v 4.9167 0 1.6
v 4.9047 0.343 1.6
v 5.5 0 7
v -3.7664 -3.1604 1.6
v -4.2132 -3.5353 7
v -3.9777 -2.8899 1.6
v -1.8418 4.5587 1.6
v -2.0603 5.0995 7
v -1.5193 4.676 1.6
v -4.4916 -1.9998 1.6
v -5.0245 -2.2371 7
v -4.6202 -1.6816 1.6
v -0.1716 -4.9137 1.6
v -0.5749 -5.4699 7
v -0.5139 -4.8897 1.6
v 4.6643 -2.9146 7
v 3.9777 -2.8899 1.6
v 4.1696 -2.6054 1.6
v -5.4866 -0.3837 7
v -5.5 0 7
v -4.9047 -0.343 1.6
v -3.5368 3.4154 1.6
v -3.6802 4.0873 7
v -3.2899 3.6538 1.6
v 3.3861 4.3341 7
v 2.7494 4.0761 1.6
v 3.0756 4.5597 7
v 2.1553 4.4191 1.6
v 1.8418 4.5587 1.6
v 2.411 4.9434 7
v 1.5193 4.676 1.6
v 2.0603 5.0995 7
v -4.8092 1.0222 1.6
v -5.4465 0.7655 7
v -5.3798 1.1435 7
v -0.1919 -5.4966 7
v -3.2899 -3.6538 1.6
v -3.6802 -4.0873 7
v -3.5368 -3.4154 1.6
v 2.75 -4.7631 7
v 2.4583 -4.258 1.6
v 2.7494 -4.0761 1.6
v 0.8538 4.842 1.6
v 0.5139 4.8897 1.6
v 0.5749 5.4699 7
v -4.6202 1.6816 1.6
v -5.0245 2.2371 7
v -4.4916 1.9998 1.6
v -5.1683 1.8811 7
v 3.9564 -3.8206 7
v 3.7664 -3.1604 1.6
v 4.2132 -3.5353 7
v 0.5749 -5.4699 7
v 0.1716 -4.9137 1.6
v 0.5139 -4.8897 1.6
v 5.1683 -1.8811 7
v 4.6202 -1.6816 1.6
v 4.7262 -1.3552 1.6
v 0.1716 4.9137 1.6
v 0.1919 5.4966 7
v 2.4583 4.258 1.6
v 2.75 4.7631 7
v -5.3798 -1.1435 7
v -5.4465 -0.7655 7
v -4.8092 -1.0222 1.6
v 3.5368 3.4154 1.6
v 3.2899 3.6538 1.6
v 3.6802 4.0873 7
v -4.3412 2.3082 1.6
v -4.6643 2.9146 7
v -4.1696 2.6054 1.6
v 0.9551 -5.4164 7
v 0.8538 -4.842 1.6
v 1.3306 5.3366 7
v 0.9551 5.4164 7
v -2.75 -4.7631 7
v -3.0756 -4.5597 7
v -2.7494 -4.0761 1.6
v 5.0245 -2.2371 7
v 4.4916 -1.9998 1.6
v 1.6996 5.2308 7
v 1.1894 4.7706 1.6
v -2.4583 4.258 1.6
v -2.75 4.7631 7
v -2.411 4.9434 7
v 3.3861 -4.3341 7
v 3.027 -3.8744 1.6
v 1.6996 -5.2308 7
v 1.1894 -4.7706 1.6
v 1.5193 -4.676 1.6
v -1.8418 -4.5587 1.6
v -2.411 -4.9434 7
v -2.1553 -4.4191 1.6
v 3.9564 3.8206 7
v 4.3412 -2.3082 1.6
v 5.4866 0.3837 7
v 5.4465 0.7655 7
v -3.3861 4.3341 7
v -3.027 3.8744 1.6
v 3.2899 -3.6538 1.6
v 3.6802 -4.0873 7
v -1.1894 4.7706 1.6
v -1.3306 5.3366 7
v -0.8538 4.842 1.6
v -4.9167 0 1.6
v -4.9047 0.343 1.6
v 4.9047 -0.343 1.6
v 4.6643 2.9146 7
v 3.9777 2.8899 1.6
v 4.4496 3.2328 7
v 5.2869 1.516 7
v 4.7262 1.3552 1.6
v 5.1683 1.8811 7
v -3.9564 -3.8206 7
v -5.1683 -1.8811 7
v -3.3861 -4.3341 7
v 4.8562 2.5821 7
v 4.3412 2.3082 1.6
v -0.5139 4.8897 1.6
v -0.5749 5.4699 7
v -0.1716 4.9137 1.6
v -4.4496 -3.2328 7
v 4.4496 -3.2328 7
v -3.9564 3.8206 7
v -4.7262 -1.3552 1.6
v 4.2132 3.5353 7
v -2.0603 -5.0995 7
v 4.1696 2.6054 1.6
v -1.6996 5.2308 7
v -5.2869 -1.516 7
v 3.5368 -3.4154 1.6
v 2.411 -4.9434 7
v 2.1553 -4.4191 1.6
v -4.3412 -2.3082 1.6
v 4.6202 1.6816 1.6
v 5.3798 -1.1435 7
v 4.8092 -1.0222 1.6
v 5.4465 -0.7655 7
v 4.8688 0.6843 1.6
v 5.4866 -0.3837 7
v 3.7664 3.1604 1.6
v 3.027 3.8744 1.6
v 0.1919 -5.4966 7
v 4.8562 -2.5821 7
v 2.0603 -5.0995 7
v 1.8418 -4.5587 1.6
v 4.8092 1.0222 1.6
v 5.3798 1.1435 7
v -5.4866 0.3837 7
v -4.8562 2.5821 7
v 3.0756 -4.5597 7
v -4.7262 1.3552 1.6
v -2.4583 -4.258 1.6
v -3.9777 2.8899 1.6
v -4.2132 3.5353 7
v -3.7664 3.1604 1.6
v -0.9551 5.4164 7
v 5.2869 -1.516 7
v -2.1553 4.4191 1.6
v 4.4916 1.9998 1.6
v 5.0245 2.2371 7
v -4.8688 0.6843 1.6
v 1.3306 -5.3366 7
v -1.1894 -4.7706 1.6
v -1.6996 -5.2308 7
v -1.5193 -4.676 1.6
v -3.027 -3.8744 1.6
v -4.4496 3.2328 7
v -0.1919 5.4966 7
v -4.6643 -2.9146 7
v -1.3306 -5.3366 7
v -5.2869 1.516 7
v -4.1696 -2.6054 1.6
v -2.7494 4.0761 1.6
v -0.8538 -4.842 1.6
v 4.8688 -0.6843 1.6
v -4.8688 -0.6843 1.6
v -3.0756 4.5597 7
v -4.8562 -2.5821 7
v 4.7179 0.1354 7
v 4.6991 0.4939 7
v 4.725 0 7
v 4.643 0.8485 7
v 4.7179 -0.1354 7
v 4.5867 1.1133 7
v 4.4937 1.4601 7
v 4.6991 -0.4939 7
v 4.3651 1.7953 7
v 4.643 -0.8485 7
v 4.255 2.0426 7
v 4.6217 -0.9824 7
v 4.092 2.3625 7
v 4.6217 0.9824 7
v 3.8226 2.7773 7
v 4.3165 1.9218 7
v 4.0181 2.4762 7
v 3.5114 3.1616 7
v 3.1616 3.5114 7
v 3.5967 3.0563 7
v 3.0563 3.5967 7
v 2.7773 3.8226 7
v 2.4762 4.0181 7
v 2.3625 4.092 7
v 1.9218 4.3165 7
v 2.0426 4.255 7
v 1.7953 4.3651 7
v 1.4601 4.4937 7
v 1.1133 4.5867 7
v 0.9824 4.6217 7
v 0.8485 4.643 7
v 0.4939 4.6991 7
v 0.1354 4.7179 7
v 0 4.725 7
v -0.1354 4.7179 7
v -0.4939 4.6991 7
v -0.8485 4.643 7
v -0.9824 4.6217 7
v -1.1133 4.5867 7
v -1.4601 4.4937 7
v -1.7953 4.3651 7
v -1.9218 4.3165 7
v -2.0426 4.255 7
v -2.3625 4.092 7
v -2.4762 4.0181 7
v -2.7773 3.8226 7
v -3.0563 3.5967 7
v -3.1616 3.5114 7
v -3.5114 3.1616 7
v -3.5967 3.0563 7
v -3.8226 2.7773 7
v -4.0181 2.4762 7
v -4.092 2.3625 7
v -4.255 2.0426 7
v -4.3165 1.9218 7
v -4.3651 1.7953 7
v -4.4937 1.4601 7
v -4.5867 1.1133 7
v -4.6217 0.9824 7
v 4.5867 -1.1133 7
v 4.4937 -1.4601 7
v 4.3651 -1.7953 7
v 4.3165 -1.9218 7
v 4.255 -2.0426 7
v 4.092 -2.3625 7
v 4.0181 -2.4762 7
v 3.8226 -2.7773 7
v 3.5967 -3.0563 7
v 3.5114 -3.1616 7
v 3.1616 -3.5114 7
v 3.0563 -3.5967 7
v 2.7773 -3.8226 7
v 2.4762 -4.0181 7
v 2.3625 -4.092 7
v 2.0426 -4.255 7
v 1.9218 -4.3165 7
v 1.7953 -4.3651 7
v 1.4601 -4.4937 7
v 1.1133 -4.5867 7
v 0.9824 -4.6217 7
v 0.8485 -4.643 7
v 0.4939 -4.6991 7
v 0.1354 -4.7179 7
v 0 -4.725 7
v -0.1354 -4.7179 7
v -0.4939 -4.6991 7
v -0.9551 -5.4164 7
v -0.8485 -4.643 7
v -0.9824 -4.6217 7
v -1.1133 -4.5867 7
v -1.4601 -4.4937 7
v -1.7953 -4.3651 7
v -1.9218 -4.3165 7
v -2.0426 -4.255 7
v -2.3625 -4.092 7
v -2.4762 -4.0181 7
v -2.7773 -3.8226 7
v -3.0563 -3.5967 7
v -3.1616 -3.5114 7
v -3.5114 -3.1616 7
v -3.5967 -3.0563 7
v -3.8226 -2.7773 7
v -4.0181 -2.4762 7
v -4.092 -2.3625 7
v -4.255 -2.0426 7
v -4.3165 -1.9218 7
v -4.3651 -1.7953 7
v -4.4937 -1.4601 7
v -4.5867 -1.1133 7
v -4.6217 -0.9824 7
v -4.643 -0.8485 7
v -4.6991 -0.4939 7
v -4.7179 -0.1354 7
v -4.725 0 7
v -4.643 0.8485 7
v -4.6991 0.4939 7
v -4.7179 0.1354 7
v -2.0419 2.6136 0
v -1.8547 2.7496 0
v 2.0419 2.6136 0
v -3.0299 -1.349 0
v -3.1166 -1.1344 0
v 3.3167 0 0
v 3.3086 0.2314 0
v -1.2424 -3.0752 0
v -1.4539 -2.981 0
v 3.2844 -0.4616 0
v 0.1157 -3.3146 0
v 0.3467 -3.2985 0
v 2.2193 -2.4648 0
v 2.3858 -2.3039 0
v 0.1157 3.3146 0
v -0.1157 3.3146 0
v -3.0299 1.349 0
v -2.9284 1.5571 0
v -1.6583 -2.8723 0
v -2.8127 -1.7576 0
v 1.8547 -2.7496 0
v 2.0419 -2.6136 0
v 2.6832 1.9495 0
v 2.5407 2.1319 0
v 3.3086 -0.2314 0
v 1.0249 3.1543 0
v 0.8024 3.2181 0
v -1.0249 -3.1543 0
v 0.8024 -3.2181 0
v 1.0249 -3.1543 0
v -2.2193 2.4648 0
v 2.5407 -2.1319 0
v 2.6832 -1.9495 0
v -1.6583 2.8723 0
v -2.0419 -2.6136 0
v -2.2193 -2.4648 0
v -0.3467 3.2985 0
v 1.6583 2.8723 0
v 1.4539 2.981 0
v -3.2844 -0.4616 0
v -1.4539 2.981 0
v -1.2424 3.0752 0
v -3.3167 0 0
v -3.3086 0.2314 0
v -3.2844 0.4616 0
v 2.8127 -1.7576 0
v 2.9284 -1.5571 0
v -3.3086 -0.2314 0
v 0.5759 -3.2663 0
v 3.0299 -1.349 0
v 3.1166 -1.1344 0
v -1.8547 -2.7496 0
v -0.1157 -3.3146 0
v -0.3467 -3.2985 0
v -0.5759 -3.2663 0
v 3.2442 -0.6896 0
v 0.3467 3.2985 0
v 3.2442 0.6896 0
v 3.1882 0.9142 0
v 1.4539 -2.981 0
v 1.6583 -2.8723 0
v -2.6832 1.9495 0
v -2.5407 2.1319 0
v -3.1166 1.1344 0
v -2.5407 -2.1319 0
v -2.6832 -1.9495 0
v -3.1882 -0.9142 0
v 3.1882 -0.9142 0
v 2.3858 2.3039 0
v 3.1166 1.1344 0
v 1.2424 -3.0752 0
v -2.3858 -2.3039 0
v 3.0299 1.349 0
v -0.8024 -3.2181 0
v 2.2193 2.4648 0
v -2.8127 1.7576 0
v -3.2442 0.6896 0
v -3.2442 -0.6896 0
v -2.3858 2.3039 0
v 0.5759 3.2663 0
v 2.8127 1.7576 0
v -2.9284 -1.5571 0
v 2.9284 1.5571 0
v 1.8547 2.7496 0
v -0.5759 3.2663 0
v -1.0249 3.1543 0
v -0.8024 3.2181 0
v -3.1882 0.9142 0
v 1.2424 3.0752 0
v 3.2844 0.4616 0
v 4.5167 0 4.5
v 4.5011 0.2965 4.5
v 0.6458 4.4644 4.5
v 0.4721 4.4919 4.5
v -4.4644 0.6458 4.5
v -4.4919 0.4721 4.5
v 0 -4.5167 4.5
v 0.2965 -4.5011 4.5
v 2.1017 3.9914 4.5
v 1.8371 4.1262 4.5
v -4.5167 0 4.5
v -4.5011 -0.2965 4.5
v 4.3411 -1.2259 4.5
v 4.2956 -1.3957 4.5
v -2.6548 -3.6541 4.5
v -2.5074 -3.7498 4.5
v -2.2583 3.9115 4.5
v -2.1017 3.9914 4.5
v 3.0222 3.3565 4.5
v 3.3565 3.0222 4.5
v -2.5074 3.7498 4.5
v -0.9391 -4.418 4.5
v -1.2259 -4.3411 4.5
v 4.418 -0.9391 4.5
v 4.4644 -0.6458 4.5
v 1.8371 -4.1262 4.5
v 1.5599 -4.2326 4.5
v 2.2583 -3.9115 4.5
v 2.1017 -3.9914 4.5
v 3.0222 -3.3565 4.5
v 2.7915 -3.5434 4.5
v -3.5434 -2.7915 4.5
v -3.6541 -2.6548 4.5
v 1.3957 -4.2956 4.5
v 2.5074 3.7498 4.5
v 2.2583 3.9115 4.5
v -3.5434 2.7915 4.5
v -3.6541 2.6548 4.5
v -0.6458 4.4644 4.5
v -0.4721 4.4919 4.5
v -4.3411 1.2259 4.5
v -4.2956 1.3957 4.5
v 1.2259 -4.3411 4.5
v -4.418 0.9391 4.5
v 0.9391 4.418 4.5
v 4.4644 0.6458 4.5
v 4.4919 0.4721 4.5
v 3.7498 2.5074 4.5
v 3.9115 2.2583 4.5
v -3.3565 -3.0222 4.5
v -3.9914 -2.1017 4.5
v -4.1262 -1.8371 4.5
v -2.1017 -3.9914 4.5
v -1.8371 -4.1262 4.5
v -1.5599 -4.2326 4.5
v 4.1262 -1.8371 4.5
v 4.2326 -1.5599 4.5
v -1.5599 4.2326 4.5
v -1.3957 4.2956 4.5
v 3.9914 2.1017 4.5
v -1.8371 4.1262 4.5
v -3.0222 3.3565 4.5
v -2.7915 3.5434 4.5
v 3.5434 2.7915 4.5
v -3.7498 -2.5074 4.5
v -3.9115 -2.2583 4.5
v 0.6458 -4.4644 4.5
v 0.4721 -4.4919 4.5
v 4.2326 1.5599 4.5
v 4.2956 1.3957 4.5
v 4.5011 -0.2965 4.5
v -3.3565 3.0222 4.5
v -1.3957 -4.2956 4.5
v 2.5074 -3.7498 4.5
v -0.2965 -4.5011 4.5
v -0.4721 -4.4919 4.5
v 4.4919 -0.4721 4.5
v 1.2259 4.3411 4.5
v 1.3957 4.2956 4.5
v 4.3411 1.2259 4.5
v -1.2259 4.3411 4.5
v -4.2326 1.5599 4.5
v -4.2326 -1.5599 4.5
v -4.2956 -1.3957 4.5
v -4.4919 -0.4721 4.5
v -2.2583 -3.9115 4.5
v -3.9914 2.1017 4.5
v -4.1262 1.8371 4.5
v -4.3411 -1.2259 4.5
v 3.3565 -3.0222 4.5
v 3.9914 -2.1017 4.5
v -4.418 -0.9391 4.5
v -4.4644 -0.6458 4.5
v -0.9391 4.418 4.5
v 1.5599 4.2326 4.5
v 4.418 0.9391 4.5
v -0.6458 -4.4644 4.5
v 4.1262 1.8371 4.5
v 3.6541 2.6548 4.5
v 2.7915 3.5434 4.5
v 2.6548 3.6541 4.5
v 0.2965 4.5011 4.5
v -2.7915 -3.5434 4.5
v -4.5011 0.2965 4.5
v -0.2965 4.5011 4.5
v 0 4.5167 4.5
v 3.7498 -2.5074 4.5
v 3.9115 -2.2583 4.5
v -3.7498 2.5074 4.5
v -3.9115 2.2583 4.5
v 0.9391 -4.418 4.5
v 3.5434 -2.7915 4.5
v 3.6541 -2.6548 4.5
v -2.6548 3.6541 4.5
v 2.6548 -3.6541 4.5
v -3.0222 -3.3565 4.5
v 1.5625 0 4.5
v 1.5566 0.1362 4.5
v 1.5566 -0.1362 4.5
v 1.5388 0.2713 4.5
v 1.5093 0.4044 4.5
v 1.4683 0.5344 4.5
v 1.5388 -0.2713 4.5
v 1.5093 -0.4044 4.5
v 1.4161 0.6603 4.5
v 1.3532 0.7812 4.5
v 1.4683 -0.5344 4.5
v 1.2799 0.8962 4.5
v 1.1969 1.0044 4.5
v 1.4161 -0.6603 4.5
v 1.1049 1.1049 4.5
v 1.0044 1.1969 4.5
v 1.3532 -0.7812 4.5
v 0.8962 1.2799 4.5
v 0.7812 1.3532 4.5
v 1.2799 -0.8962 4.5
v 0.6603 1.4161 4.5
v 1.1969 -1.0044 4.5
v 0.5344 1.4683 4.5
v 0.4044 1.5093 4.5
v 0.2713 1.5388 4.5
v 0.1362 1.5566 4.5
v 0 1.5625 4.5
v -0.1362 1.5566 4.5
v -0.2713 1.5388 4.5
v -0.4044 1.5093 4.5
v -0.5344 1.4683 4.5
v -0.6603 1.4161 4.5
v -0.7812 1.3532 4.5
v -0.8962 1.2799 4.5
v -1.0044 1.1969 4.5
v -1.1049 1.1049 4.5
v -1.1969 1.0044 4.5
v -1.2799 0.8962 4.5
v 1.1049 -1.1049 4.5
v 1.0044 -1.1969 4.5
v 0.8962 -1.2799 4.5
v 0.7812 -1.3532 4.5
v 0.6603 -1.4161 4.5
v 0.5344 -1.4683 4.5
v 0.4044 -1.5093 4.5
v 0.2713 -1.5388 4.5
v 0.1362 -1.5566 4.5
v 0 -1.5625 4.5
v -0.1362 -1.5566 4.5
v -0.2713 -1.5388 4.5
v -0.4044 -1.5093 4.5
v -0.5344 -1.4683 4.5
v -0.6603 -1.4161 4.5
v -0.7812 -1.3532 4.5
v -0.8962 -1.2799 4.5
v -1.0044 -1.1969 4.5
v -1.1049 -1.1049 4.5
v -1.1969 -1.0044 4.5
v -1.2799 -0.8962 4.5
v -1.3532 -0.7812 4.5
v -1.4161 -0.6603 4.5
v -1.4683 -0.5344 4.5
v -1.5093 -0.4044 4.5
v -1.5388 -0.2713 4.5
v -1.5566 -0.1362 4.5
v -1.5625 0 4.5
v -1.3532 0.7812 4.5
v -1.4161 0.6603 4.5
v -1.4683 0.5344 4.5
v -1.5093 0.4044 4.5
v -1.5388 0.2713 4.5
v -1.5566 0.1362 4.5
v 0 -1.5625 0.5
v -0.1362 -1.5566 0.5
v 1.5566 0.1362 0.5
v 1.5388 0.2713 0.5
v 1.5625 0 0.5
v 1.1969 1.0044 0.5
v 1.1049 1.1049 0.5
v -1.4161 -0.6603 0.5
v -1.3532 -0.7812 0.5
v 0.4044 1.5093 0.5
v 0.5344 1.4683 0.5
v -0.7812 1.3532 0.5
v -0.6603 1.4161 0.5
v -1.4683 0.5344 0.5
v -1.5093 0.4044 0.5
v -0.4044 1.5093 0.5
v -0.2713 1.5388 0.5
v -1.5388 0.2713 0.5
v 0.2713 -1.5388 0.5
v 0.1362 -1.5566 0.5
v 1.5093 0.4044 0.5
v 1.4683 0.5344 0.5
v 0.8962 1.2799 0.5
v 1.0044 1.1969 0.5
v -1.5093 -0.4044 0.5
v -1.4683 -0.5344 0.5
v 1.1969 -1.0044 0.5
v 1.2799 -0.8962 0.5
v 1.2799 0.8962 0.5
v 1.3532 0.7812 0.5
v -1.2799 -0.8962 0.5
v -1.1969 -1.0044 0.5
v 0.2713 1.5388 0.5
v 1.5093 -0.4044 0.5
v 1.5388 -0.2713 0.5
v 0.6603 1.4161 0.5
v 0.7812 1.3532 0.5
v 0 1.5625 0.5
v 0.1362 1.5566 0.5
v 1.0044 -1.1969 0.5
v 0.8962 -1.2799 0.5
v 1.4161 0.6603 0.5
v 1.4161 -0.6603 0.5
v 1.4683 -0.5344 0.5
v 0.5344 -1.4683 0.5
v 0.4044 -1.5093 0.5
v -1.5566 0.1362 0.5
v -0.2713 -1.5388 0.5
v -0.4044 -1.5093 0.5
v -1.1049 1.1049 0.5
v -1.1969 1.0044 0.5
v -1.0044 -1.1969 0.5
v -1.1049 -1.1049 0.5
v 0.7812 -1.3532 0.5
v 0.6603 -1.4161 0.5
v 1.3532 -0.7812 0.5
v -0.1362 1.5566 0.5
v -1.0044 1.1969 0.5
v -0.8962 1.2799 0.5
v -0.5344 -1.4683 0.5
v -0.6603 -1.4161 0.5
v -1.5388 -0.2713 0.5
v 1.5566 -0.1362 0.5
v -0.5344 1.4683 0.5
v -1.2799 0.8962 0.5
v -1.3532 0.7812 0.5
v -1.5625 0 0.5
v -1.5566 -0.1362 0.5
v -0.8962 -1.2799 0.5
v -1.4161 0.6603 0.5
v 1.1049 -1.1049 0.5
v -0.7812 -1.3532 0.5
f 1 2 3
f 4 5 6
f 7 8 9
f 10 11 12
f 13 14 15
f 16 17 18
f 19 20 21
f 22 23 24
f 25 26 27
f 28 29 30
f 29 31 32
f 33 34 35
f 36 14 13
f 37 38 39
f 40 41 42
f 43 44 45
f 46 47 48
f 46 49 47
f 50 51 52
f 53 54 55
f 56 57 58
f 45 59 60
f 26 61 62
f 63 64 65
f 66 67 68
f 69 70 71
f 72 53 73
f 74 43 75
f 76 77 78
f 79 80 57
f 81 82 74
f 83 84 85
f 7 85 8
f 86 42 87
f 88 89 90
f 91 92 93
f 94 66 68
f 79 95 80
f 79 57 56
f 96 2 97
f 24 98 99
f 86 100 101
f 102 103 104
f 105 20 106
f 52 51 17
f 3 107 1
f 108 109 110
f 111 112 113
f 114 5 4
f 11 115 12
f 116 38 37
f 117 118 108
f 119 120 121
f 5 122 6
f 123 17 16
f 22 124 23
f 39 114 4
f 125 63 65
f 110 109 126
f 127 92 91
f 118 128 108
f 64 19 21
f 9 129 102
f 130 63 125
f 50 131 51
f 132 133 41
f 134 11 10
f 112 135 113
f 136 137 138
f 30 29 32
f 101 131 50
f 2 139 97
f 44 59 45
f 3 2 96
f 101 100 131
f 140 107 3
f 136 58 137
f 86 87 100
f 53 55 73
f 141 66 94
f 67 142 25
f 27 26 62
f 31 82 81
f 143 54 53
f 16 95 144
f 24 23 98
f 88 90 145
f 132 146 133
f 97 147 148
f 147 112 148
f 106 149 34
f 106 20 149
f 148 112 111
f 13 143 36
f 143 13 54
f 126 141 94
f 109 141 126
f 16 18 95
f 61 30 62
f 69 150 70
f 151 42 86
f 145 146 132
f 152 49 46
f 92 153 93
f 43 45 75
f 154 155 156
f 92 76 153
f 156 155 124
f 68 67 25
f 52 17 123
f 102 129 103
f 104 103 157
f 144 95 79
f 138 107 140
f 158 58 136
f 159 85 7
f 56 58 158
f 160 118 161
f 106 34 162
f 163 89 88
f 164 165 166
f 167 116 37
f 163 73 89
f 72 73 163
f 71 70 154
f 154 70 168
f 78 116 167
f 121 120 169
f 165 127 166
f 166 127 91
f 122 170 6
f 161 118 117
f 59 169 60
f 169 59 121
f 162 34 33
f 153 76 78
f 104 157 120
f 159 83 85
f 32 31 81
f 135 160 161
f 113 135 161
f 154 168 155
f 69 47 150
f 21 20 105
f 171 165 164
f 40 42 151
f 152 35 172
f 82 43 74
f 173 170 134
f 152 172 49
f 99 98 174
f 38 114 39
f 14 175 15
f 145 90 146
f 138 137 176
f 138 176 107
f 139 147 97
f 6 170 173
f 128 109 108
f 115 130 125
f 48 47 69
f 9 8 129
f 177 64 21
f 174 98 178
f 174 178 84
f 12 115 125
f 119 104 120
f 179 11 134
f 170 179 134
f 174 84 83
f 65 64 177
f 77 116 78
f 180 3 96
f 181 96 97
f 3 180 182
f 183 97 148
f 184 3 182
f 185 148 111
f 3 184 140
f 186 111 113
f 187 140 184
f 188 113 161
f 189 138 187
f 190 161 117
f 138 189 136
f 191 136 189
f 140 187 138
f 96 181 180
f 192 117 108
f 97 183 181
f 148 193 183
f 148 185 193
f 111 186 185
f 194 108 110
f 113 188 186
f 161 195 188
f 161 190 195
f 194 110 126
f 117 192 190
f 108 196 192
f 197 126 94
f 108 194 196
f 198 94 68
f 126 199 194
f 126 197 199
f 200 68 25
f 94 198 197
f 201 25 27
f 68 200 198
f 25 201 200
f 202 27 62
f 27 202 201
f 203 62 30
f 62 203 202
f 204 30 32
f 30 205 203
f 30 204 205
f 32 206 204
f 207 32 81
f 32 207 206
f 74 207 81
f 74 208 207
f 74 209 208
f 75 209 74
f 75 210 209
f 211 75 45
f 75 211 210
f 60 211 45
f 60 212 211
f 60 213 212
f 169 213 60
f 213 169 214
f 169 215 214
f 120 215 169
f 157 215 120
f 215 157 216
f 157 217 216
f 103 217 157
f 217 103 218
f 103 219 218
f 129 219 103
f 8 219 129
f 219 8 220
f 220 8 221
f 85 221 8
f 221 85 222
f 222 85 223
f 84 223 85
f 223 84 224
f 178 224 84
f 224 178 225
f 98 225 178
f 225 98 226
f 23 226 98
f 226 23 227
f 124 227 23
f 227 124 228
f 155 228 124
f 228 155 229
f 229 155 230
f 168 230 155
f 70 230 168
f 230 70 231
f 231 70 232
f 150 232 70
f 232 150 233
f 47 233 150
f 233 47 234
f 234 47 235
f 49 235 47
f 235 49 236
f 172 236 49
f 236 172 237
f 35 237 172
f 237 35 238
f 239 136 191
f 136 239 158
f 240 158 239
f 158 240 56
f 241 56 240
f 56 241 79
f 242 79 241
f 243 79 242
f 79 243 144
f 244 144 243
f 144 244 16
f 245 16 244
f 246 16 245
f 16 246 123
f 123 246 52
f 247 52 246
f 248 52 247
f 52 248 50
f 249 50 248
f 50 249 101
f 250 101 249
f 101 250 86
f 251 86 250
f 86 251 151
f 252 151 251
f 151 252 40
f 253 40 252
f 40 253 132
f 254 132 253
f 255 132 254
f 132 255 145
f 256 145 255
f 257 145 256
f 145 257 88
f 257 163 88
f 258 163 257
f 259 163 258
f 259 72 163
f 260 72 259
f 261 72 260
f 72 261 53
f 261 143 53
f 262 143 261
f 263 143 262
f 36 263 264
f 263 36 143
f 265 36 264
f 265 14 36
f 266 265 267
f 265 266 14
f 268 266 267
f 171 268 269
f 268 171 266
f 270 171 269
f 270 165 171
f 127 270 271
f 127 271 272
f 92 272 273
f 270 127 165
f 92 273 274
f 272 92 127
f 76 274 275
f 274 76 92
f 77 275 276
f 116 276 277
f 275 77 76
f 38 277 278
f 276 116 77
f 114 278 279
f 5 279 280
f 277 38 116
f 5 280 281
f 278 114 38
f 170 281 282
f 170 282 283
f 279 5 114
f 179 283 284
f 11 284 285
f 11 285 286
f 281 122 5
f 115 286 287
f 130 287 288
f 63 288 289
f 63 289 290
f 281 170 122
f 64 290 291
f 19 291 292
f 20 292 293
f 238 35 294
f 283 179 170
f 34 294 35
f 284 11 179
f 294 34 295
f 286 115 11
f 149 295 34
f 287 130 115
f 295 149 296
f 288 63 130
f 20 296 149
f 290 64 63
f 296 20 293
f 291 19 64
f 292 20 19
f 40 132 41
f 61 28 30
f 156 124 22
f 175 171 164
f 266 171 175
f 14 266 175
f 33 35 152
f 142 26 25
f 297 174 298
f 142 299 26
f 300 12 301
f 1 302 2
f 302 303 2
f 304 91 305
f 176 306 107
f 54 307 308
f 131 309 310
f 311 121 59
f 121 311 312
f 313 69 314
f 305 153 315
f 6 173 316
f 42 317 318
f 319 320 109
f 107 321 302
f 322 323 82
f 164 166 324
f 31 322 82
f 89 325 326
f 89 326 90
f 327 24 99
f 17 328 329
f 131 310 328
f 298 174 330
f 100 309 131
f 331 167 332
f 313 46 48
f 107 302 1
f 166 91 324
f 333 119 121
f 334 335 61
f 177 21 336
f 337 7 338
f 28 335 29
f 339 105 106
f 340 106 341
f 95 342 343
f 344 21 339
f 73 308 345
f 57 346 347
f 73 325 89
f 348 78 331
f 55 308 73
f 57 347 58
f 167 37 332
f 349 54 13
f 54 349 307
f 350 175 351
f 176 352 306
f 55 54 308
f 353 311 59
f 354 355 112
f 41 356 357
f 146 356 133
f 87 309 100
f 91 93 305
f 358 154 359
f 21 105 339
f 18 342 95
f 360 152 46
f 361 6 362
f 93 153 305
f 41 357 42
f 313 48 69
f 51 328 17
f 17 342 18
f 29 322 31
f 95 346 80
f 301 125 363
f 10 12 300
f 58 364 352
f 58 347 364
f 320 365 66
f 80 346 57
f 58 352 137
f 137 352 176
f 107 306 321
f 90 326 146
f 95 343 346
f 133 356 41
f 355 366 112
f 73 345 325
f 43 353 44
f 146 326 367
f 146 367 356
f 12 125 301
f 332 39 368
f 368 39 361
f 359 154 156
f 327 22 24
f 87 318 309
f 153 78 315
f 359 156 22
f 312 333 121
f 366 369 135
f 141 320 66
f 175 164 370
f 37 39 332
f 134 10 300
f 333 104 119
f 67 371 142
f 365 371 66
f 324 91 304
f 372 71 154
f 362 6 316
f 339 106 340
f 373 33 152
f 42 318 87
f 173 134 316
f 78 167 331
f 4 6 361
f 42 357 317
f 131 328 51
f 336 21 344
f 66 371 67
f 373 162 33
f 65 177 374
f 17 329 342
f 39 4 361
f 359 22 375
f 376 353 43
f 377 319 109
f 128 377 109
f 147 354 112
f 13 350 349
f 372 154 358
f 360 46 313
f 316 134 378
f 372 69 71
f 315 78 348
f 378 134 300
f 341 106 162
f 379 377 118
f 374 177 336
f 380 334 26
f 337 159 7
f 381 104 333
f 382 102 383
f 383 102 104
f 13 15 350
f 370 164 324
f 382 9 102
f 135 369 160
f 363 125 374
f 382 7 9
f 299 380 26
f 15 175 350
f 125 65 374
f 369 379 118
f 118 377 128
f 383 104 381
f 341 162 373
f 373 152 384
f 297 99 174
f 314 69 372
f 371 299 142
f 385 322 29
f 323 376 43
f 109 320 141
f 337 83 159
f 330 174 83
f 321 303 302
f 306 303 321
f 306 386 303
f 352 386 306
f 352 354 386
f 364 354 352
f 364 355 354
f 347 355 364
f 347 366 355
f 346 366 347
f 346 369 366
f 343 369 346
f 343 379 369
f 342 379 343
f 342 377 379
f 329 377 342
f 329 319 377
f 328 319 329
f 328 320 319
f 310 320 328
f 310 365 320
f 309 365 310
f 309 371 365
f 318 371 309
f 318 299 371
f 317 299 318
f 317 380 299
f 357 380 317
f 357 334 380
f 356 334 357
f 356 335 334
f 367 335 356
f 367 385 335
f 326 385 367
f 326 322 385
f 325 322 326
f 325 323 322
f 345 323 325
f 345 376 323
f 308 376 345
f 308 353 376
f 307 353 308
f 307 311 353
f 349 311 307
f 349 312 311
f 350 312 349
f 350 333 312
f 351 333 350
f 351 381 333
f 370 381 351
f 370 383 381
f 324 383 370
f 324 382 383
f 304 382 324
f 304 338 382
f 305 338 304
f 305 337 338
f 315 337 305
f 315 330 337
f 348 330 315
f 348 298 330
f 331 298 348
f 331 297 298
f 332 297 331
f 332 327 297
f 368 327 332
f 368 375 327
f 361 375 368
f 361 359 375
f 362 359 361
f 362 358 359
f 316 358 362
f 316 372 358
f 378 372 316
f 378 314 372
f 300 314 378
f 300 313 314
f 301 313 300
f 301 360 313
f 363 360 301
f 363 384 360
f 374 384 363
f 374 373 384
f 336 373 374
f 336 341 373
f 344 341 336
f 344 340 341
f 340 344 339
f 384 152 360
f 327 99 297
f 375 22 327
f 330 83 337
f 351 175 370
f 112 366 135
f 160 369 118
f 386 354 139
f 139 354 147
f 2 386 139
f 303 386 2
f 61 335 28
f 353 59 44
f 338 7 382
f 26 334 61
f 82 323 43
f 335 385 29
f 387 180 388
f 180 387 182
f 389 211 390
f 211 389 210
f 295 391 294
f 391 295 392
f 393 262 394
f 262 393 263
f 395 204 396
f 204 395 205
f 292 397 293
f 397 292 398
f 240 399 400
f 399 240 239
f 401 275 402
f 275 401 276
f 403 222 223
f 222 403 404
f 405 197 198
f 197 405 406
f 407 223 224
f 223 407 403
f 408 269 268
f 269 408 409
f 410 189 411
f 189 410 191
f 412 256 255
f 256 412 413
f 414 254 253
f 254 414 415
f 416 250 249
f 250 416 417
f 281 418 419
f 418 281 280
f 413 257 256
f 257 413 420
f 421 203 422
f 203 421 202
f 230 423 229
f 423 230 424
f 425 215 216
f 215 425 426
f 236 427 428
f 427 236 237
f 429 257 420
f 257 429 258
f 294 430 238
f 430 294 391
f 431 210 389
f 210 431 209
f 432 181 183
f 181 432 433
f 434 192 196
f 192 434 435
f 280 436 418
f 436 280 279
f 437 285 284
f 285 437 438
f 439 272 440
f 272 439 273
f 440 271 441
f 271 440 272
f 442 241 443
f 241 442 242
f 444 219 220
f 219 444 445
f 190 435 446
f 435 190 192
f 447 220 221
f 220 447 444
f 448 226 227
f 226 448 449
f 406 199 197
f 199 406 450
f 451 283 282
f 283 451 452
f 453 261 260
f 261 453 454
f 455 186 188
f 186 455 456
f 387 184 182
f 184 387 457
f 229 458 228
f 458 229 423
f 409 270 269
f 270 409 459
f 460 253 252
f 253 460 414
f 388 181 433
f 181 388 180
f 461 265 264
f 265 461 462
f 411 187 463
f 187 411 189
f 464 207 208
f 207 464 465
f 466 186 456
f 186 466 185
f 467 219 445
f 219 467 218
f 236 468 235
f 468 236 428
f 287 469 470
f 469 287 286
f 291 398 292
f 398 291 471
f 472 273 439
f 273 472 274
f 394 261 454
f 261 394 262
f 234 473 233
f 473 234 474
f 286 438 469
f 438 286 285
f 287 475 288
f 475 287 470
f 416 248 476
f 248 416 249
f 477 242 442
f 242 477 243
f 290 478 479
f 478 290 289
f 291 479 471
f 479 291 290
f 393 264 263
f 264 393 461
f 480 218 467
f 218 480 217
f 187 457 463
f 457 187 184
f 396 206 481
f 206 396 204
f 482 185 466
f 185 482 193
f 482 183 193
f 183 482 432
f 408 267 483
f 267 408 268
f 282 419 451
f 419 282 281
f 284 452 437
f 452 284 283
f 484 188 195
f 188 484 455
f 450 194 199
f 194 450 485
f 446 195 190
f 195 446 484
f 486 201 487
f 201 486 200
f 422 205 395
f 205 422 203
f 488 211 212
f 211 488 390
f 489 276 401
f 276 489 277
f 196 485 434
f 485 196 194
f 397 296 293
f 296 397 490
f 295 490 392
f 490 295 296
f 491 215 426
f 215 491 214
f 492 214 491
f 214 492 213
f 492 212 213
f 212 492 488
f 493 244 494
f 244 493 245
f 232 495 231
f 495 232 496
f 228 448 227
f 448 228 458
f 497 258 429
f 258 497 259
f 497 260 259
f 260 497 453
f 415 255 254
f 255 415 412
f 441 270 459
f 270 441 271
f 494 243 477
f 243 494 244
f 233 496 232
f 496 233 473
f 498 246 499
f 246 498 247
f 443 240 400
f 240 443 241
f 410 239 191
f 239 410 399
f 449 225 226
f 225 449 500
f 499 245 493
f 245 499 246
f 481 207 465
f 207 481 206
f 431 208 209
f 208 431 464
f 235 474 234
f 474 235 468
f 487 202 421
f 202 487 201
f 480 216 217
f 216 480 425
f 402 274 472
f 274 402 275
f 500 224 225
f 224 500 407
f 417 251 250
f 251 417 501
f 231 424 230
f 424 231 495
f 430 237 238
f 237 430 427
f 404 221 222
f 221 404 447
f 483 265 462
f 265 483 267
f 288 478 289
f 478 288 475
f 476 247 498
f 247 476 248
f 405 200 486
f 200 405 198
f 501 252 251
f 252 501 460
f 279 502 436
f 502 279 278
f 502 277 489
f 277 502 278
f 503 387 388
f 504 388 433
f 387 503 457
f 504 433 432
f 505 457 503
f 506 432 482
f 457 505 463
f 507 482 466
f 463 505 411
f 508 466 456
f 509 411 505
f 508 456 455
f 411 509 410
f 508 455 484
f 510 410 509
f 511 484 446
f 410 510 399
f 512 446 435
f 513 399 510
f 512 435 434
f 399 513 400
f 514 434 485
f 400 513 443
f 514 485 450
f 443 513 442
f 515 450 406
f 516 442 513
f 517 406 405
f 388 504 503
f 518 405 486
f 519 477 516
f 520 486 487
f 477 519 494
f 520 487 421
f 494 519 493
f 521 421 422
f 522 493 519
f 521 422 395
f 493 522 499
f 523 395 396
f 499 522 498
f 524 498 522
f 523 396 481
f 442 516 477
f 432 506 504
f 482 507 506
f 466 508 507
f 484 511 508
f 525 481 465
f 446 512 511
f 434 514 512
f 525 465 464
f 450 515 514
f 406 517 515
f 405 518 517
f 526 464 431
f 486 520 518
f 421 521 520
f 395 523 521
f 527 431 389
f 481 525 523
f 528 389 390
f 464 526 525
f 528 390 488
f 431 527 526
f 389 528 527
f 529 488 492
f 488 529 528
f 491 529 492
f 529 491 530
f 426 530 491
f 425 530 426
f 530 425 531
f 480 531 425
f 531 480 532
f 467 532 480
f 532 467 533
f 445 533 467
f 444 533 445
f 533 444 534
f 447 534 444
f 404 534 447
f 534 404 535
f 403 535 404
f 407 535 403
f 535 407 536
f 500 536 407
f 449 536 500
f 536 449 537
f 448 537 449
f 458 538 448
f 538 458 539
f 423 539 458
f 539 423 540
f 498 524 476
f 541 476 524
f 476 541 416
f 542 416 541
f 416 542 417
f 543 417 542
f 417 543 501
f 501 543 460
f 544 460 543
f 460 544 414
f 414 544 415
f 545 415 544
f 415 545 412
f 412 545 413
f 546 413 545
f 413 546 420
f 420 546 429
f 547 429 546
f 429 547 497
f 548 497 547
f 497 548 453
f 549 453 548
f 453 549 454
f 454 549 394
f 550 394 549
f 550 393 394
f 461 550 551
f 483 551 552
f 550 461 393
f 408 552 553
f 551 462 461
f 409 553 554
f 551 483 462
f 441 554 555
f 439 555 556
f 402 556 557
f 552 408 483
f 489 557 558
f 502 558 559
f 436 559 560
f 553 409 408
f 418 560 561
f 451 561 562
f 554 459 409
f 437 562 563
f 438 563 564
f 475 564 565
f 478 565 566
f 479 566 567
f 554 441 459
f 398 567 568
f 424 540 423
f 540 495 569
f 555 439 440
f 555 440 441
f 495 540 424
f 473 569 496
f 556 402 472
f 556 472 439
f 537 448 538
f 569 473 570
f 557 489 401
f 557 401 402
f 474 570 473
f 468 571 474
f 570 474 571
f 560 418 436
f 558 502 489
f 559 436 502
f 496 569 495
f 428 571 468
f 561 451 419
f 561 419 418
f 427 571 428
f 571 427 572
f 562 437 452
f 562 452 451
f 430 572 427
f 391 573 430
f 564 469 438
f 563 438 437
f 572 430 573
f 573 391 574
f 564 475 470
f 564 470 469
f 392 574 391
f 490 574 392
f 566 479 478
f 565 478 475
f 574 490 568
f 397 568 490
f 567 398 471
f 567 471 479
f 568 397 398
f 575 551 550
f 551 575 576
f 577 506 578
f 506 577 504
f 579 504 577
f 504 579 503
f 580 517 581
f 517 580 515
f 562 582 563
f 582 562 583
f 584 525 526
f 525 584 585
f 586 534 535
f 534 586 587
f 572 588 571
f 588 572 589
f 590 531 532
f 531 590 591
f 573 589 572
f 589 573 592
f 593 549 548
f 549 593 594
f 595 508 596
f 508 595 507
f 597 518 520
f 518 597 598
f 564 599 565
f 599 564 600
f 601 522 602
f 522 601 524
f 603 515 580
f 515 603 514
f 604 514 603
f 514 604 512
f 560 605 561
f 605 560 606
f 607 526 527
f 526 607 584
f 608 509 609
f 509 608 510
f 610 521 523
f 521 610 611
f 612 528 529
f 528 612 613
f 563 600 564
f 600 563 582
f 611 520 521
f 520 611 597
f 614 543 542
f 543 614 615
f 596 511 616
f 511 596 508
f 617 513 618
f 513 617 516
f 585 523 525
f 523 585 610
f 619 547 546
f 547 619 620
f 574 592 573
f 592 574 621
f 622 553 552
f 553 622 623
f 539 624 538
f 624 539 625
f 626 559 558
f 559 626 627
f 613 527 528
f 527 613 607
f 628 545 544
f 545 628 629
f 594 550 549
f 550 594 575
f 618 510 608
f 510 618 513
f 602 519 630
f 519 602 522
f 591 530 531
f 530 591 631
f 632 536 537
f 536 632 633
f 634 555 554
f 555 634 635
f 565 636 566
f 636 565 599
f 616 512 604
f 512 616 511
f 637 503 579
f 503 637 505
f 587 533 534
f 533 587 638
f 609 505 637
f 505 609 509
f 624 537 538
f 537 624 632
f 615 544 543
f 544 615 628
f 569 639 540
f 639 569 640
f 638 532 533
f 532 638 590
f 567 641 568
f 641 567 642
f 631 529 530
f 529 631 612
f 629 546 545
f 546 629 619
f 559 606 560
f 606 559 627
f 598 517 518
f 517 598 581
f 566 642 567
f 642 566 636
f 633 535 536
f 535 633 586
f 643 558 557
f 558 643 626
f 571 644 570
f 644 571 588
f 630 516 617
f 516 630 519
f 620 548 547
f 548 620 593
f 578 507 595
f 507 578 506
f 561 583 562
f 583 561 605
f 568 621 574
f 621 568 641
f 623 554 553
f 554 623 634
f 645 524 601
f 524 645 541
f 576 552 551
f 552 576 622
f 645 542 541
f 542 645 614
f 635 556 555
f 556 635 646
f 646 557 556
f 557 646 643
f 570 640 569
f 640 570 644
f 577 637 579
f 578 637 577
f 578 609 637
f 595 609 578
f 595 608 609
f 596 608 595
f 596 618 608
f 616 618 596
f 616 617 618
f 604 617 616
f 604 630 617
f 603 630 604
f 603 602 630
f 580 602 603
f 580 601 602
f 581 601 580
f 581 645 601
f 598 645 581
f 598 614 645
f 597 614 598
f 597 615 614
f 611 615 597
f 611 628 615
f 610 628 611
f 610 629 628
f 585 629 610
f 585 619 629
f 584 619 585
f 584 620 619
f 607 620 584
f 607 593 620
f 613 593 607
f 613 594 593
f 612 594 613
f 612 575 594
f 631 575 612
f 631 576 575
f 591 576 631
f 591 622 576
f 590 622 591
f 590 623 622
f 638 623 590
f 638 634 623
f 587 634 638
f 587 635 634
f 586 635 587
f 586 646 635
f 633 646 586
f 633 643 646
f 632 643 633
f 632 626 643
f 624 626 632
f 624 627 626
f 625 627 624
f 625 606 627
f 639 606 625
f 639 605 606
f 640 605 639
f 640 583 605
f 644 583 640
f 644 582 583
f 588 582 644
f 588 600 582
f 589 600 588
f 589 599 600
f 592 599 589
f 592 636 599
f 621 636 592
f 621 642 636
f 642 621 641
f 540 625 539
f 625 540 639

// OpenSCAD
/*

    **** ROBUST PARAMETRIC KNOB FOR ROTARY CONTROLS *****

    Torbjorn Skauli (tskauli@gmail.com)
    August 2018, released in the public domain.

This is a rotary knob such as those used for volume controls. The shape of the knob can be adjusted, mainly by changing its outer diameter, height and taper towards the top. It is also possible to add an arrow indicator on the top surface, and the shape can be made faceted rather than round. A bevelled edge around the top is also adjustable in the code.

The knob normally uses a set screw from the side. The screw is held by a nut resting on a washer, to ensure strength that allows for tightening. Either a headless setscrew can be used, or an optional recess for a flat head screw can be enabled. It is also possible to disable the screw and nut holes, for press fit on the shaft The inner structures can be recessed into the knob to enclose the mounting nut of the shaft in the panel.

The knob is designed to be printed upside down, and does not need any support material on printers capable of printing a 45-degree overhang, thanks to teardrop-shaped holes.

To assemble, first insert a washer and a nut in their slots, and then thread the screw in from the side. The washer may need to be pressed in with some force using pliers, depending on the accuracy of the print. If using a headed screw, the knob looks nicest if the screw length is such that the head is approximately flush with the outer surface when tightened.

*/
has_setscrew=0; // [ 1:include a set screw, 0:only shaft hole ]
has_arrow=0;    // [ 1:include an indicator arrow, 2:plain top ]
has_screwhead=0;// [ 1:screw with head - enlarged hole, 0:hex socket set screw ]

// No. of outer facets, or =0 if smooth
facets=0;       

// Pushbutton axis diameter
axdia=3.1; 

// Knob outer diameter
outdia=11;

// Height of outer part of knob
outheig=7;     

// Recess depth inside outer shell to accommodate pot panel mount nut
innerrecess=2.5;

// Radius reduction for tapering of main part, =0 for cylindrical shape.
rtaper=1*7/12;       

// set screw diameter
scrdia=3;       

/* [Hidden] */
twall=0.6;      // outer wall thickness
thinwall=0.5;   // thickness at the bottom of the axis hole (to push in as far as possible)
taxis=5;        // thickness of material around axis
tol=0.025;      // tolerance for fit, adapt to printer
gap=0.1;        // loose fit, adapt to printer
cacc=6;         // SPEED / ACCURACY scaling factor for $fn etc. 1=draft, >1=final
rbevel=1.6;     // delta radius to bevel start, also depth of arrow

// Hardware dimensions (adapted from. http://www.metrication.com/engineering/fastener.html)
scrhdia=2*scrdia;       // screw head diameter
washdia=2.6*scrdia;     // washer diameter and thickness
washthic=0.5+gap;       // washer thickness
nutdia=1.9*scrdia+gap;  // nut smallest diameter
nutdiaouter=2.2*scrdia; // nut largest diameter and thickness (check)
nutthic=0.9*scrdia+gap; // nut thickness
axgapfac=0.06;          // factor to move nut room closer to axis, rel to axis radius to avoid thin walls between nut and axis

wscrbase=axdia+2*taxis; // width of screw base
lscrbase=4*scrdia;      // length of screw base
innheig=outheig-innerrecess;// height of inner part
scrheig=innheig-max(washdia/2, scrdia);// height of screw hole

module teardropHole(lh,rh){ // Hole with 45-degree teardrop shape, no support material
    rotate([0,0,-135])
    union(){
        cylinder(h=lh,r1=rh,r2=rh,$fn=8*cacc);
        cube([rh,rh,lh]);
    };
};
module outershape(){ // Outer shape of knob
    union(){
        if (facets){
            translate([0,0,rbevel])
            cylinder(r1=(outdia)/2-rtaper,r2=outdia/2,h=outheig-rbevel,$fn=facets);
            cylinder(r1=(outdia)/2-rbevel-rtaper,r2=(outdia)/2-rtaper,h=rbevel,$fn=facets);
        }
        else{
            translate([0,0,rbevel])
            cylinder(r1=(outdia)/2-rtaper,r2=outdia/2,h=outheig-rbevel,$fn=15*cacc);
            cylinder(r1=(outdia)/2-rbevel-rtaper,r2=(outdia)/2-rtaper,h=rbevel,$fn=15*cacc);
        };
        
    };
};
module cavity(){ // inner cavity, to save plastic
    translate([0,0,max(twall,rbevel+thinwall)]) // cavity to save plastic
    cylinder(r1=(outdia)/2-twall-rtaper,r2=(outdia)/2-twall,h=outheig,$fn=10*cacc);
};
module axismount(){ // axis hole and clamp screw block
    intersection(){
        union(){ 
            // axis tube
            cylinder(d=axdia+2*taxis,h=innheig,$fn=15*cacc);
            // block for nut
            if (has_setscrew)
                translate([-wscrbase/2,0,0])
                cube([wscrbase,outdia/2,innheig]);
        };
        // ensure fit within outer shape
        outershape();
    };
};
module holes(){ // shapes to be carved out of the knob
    // axis hole
    translate([0,0,thinwall]) 
    cylinder(d=axdia+tol,h=innheig,$fn=12*cacc);

    // arrow indicator
    if (has_arrow)
        translate([0,-max(outdia/8,axdia/2+thinwall),0])
        rotate([90,0,0])
        cylinder(r=rbevel,h=outdia,$fn=4);
    
    // holes and recesses for screw, nut and washer
    if (has_setscrew) {
        // screw hole
        translate([0,0,scrheig])
        rotate([-90,0,0])
        teardropHole(rh=(scrdia+gap)/2,lh=outdia);
        
        //nut recess
        translate([-(nutdia+gap)/2,axdia*(0.5-axgapfac),scrheig-nutdiaouter/2-gap])
        cube([nutdia+gap,nutthic+axdia*axgapfac,outheig]);
        
        
        // washer recess, lower part
        translate([-(washdia+gap)/2,axdia/2+nutthic,scrheig-0*washdia/2-gap])
        cube([washdia+gap,washthic,outheig]);
        
        // washer recess, upper part
        translate([0,axdia/2+nutthic,scrheig])
        rotate([-90,0,0])
        #cylinder(d=washdia,h=washthic);

        // screw head recess
        if (has_screwhead)
            translate([0,axdia/2+nutthic+washthic+scrdia,scrheig])
            rotate([-90,0,0]) 
            teardropHole(rh=(scrhdia+gap)/2,lh=outdia);
    };
  
};
difference(){ // screw holes and arrow erosion
    union(){ // shell and screw mount
        difference(){
            outershape();
            cavity();
        };
        axismount();    

    };
        holes();
};
